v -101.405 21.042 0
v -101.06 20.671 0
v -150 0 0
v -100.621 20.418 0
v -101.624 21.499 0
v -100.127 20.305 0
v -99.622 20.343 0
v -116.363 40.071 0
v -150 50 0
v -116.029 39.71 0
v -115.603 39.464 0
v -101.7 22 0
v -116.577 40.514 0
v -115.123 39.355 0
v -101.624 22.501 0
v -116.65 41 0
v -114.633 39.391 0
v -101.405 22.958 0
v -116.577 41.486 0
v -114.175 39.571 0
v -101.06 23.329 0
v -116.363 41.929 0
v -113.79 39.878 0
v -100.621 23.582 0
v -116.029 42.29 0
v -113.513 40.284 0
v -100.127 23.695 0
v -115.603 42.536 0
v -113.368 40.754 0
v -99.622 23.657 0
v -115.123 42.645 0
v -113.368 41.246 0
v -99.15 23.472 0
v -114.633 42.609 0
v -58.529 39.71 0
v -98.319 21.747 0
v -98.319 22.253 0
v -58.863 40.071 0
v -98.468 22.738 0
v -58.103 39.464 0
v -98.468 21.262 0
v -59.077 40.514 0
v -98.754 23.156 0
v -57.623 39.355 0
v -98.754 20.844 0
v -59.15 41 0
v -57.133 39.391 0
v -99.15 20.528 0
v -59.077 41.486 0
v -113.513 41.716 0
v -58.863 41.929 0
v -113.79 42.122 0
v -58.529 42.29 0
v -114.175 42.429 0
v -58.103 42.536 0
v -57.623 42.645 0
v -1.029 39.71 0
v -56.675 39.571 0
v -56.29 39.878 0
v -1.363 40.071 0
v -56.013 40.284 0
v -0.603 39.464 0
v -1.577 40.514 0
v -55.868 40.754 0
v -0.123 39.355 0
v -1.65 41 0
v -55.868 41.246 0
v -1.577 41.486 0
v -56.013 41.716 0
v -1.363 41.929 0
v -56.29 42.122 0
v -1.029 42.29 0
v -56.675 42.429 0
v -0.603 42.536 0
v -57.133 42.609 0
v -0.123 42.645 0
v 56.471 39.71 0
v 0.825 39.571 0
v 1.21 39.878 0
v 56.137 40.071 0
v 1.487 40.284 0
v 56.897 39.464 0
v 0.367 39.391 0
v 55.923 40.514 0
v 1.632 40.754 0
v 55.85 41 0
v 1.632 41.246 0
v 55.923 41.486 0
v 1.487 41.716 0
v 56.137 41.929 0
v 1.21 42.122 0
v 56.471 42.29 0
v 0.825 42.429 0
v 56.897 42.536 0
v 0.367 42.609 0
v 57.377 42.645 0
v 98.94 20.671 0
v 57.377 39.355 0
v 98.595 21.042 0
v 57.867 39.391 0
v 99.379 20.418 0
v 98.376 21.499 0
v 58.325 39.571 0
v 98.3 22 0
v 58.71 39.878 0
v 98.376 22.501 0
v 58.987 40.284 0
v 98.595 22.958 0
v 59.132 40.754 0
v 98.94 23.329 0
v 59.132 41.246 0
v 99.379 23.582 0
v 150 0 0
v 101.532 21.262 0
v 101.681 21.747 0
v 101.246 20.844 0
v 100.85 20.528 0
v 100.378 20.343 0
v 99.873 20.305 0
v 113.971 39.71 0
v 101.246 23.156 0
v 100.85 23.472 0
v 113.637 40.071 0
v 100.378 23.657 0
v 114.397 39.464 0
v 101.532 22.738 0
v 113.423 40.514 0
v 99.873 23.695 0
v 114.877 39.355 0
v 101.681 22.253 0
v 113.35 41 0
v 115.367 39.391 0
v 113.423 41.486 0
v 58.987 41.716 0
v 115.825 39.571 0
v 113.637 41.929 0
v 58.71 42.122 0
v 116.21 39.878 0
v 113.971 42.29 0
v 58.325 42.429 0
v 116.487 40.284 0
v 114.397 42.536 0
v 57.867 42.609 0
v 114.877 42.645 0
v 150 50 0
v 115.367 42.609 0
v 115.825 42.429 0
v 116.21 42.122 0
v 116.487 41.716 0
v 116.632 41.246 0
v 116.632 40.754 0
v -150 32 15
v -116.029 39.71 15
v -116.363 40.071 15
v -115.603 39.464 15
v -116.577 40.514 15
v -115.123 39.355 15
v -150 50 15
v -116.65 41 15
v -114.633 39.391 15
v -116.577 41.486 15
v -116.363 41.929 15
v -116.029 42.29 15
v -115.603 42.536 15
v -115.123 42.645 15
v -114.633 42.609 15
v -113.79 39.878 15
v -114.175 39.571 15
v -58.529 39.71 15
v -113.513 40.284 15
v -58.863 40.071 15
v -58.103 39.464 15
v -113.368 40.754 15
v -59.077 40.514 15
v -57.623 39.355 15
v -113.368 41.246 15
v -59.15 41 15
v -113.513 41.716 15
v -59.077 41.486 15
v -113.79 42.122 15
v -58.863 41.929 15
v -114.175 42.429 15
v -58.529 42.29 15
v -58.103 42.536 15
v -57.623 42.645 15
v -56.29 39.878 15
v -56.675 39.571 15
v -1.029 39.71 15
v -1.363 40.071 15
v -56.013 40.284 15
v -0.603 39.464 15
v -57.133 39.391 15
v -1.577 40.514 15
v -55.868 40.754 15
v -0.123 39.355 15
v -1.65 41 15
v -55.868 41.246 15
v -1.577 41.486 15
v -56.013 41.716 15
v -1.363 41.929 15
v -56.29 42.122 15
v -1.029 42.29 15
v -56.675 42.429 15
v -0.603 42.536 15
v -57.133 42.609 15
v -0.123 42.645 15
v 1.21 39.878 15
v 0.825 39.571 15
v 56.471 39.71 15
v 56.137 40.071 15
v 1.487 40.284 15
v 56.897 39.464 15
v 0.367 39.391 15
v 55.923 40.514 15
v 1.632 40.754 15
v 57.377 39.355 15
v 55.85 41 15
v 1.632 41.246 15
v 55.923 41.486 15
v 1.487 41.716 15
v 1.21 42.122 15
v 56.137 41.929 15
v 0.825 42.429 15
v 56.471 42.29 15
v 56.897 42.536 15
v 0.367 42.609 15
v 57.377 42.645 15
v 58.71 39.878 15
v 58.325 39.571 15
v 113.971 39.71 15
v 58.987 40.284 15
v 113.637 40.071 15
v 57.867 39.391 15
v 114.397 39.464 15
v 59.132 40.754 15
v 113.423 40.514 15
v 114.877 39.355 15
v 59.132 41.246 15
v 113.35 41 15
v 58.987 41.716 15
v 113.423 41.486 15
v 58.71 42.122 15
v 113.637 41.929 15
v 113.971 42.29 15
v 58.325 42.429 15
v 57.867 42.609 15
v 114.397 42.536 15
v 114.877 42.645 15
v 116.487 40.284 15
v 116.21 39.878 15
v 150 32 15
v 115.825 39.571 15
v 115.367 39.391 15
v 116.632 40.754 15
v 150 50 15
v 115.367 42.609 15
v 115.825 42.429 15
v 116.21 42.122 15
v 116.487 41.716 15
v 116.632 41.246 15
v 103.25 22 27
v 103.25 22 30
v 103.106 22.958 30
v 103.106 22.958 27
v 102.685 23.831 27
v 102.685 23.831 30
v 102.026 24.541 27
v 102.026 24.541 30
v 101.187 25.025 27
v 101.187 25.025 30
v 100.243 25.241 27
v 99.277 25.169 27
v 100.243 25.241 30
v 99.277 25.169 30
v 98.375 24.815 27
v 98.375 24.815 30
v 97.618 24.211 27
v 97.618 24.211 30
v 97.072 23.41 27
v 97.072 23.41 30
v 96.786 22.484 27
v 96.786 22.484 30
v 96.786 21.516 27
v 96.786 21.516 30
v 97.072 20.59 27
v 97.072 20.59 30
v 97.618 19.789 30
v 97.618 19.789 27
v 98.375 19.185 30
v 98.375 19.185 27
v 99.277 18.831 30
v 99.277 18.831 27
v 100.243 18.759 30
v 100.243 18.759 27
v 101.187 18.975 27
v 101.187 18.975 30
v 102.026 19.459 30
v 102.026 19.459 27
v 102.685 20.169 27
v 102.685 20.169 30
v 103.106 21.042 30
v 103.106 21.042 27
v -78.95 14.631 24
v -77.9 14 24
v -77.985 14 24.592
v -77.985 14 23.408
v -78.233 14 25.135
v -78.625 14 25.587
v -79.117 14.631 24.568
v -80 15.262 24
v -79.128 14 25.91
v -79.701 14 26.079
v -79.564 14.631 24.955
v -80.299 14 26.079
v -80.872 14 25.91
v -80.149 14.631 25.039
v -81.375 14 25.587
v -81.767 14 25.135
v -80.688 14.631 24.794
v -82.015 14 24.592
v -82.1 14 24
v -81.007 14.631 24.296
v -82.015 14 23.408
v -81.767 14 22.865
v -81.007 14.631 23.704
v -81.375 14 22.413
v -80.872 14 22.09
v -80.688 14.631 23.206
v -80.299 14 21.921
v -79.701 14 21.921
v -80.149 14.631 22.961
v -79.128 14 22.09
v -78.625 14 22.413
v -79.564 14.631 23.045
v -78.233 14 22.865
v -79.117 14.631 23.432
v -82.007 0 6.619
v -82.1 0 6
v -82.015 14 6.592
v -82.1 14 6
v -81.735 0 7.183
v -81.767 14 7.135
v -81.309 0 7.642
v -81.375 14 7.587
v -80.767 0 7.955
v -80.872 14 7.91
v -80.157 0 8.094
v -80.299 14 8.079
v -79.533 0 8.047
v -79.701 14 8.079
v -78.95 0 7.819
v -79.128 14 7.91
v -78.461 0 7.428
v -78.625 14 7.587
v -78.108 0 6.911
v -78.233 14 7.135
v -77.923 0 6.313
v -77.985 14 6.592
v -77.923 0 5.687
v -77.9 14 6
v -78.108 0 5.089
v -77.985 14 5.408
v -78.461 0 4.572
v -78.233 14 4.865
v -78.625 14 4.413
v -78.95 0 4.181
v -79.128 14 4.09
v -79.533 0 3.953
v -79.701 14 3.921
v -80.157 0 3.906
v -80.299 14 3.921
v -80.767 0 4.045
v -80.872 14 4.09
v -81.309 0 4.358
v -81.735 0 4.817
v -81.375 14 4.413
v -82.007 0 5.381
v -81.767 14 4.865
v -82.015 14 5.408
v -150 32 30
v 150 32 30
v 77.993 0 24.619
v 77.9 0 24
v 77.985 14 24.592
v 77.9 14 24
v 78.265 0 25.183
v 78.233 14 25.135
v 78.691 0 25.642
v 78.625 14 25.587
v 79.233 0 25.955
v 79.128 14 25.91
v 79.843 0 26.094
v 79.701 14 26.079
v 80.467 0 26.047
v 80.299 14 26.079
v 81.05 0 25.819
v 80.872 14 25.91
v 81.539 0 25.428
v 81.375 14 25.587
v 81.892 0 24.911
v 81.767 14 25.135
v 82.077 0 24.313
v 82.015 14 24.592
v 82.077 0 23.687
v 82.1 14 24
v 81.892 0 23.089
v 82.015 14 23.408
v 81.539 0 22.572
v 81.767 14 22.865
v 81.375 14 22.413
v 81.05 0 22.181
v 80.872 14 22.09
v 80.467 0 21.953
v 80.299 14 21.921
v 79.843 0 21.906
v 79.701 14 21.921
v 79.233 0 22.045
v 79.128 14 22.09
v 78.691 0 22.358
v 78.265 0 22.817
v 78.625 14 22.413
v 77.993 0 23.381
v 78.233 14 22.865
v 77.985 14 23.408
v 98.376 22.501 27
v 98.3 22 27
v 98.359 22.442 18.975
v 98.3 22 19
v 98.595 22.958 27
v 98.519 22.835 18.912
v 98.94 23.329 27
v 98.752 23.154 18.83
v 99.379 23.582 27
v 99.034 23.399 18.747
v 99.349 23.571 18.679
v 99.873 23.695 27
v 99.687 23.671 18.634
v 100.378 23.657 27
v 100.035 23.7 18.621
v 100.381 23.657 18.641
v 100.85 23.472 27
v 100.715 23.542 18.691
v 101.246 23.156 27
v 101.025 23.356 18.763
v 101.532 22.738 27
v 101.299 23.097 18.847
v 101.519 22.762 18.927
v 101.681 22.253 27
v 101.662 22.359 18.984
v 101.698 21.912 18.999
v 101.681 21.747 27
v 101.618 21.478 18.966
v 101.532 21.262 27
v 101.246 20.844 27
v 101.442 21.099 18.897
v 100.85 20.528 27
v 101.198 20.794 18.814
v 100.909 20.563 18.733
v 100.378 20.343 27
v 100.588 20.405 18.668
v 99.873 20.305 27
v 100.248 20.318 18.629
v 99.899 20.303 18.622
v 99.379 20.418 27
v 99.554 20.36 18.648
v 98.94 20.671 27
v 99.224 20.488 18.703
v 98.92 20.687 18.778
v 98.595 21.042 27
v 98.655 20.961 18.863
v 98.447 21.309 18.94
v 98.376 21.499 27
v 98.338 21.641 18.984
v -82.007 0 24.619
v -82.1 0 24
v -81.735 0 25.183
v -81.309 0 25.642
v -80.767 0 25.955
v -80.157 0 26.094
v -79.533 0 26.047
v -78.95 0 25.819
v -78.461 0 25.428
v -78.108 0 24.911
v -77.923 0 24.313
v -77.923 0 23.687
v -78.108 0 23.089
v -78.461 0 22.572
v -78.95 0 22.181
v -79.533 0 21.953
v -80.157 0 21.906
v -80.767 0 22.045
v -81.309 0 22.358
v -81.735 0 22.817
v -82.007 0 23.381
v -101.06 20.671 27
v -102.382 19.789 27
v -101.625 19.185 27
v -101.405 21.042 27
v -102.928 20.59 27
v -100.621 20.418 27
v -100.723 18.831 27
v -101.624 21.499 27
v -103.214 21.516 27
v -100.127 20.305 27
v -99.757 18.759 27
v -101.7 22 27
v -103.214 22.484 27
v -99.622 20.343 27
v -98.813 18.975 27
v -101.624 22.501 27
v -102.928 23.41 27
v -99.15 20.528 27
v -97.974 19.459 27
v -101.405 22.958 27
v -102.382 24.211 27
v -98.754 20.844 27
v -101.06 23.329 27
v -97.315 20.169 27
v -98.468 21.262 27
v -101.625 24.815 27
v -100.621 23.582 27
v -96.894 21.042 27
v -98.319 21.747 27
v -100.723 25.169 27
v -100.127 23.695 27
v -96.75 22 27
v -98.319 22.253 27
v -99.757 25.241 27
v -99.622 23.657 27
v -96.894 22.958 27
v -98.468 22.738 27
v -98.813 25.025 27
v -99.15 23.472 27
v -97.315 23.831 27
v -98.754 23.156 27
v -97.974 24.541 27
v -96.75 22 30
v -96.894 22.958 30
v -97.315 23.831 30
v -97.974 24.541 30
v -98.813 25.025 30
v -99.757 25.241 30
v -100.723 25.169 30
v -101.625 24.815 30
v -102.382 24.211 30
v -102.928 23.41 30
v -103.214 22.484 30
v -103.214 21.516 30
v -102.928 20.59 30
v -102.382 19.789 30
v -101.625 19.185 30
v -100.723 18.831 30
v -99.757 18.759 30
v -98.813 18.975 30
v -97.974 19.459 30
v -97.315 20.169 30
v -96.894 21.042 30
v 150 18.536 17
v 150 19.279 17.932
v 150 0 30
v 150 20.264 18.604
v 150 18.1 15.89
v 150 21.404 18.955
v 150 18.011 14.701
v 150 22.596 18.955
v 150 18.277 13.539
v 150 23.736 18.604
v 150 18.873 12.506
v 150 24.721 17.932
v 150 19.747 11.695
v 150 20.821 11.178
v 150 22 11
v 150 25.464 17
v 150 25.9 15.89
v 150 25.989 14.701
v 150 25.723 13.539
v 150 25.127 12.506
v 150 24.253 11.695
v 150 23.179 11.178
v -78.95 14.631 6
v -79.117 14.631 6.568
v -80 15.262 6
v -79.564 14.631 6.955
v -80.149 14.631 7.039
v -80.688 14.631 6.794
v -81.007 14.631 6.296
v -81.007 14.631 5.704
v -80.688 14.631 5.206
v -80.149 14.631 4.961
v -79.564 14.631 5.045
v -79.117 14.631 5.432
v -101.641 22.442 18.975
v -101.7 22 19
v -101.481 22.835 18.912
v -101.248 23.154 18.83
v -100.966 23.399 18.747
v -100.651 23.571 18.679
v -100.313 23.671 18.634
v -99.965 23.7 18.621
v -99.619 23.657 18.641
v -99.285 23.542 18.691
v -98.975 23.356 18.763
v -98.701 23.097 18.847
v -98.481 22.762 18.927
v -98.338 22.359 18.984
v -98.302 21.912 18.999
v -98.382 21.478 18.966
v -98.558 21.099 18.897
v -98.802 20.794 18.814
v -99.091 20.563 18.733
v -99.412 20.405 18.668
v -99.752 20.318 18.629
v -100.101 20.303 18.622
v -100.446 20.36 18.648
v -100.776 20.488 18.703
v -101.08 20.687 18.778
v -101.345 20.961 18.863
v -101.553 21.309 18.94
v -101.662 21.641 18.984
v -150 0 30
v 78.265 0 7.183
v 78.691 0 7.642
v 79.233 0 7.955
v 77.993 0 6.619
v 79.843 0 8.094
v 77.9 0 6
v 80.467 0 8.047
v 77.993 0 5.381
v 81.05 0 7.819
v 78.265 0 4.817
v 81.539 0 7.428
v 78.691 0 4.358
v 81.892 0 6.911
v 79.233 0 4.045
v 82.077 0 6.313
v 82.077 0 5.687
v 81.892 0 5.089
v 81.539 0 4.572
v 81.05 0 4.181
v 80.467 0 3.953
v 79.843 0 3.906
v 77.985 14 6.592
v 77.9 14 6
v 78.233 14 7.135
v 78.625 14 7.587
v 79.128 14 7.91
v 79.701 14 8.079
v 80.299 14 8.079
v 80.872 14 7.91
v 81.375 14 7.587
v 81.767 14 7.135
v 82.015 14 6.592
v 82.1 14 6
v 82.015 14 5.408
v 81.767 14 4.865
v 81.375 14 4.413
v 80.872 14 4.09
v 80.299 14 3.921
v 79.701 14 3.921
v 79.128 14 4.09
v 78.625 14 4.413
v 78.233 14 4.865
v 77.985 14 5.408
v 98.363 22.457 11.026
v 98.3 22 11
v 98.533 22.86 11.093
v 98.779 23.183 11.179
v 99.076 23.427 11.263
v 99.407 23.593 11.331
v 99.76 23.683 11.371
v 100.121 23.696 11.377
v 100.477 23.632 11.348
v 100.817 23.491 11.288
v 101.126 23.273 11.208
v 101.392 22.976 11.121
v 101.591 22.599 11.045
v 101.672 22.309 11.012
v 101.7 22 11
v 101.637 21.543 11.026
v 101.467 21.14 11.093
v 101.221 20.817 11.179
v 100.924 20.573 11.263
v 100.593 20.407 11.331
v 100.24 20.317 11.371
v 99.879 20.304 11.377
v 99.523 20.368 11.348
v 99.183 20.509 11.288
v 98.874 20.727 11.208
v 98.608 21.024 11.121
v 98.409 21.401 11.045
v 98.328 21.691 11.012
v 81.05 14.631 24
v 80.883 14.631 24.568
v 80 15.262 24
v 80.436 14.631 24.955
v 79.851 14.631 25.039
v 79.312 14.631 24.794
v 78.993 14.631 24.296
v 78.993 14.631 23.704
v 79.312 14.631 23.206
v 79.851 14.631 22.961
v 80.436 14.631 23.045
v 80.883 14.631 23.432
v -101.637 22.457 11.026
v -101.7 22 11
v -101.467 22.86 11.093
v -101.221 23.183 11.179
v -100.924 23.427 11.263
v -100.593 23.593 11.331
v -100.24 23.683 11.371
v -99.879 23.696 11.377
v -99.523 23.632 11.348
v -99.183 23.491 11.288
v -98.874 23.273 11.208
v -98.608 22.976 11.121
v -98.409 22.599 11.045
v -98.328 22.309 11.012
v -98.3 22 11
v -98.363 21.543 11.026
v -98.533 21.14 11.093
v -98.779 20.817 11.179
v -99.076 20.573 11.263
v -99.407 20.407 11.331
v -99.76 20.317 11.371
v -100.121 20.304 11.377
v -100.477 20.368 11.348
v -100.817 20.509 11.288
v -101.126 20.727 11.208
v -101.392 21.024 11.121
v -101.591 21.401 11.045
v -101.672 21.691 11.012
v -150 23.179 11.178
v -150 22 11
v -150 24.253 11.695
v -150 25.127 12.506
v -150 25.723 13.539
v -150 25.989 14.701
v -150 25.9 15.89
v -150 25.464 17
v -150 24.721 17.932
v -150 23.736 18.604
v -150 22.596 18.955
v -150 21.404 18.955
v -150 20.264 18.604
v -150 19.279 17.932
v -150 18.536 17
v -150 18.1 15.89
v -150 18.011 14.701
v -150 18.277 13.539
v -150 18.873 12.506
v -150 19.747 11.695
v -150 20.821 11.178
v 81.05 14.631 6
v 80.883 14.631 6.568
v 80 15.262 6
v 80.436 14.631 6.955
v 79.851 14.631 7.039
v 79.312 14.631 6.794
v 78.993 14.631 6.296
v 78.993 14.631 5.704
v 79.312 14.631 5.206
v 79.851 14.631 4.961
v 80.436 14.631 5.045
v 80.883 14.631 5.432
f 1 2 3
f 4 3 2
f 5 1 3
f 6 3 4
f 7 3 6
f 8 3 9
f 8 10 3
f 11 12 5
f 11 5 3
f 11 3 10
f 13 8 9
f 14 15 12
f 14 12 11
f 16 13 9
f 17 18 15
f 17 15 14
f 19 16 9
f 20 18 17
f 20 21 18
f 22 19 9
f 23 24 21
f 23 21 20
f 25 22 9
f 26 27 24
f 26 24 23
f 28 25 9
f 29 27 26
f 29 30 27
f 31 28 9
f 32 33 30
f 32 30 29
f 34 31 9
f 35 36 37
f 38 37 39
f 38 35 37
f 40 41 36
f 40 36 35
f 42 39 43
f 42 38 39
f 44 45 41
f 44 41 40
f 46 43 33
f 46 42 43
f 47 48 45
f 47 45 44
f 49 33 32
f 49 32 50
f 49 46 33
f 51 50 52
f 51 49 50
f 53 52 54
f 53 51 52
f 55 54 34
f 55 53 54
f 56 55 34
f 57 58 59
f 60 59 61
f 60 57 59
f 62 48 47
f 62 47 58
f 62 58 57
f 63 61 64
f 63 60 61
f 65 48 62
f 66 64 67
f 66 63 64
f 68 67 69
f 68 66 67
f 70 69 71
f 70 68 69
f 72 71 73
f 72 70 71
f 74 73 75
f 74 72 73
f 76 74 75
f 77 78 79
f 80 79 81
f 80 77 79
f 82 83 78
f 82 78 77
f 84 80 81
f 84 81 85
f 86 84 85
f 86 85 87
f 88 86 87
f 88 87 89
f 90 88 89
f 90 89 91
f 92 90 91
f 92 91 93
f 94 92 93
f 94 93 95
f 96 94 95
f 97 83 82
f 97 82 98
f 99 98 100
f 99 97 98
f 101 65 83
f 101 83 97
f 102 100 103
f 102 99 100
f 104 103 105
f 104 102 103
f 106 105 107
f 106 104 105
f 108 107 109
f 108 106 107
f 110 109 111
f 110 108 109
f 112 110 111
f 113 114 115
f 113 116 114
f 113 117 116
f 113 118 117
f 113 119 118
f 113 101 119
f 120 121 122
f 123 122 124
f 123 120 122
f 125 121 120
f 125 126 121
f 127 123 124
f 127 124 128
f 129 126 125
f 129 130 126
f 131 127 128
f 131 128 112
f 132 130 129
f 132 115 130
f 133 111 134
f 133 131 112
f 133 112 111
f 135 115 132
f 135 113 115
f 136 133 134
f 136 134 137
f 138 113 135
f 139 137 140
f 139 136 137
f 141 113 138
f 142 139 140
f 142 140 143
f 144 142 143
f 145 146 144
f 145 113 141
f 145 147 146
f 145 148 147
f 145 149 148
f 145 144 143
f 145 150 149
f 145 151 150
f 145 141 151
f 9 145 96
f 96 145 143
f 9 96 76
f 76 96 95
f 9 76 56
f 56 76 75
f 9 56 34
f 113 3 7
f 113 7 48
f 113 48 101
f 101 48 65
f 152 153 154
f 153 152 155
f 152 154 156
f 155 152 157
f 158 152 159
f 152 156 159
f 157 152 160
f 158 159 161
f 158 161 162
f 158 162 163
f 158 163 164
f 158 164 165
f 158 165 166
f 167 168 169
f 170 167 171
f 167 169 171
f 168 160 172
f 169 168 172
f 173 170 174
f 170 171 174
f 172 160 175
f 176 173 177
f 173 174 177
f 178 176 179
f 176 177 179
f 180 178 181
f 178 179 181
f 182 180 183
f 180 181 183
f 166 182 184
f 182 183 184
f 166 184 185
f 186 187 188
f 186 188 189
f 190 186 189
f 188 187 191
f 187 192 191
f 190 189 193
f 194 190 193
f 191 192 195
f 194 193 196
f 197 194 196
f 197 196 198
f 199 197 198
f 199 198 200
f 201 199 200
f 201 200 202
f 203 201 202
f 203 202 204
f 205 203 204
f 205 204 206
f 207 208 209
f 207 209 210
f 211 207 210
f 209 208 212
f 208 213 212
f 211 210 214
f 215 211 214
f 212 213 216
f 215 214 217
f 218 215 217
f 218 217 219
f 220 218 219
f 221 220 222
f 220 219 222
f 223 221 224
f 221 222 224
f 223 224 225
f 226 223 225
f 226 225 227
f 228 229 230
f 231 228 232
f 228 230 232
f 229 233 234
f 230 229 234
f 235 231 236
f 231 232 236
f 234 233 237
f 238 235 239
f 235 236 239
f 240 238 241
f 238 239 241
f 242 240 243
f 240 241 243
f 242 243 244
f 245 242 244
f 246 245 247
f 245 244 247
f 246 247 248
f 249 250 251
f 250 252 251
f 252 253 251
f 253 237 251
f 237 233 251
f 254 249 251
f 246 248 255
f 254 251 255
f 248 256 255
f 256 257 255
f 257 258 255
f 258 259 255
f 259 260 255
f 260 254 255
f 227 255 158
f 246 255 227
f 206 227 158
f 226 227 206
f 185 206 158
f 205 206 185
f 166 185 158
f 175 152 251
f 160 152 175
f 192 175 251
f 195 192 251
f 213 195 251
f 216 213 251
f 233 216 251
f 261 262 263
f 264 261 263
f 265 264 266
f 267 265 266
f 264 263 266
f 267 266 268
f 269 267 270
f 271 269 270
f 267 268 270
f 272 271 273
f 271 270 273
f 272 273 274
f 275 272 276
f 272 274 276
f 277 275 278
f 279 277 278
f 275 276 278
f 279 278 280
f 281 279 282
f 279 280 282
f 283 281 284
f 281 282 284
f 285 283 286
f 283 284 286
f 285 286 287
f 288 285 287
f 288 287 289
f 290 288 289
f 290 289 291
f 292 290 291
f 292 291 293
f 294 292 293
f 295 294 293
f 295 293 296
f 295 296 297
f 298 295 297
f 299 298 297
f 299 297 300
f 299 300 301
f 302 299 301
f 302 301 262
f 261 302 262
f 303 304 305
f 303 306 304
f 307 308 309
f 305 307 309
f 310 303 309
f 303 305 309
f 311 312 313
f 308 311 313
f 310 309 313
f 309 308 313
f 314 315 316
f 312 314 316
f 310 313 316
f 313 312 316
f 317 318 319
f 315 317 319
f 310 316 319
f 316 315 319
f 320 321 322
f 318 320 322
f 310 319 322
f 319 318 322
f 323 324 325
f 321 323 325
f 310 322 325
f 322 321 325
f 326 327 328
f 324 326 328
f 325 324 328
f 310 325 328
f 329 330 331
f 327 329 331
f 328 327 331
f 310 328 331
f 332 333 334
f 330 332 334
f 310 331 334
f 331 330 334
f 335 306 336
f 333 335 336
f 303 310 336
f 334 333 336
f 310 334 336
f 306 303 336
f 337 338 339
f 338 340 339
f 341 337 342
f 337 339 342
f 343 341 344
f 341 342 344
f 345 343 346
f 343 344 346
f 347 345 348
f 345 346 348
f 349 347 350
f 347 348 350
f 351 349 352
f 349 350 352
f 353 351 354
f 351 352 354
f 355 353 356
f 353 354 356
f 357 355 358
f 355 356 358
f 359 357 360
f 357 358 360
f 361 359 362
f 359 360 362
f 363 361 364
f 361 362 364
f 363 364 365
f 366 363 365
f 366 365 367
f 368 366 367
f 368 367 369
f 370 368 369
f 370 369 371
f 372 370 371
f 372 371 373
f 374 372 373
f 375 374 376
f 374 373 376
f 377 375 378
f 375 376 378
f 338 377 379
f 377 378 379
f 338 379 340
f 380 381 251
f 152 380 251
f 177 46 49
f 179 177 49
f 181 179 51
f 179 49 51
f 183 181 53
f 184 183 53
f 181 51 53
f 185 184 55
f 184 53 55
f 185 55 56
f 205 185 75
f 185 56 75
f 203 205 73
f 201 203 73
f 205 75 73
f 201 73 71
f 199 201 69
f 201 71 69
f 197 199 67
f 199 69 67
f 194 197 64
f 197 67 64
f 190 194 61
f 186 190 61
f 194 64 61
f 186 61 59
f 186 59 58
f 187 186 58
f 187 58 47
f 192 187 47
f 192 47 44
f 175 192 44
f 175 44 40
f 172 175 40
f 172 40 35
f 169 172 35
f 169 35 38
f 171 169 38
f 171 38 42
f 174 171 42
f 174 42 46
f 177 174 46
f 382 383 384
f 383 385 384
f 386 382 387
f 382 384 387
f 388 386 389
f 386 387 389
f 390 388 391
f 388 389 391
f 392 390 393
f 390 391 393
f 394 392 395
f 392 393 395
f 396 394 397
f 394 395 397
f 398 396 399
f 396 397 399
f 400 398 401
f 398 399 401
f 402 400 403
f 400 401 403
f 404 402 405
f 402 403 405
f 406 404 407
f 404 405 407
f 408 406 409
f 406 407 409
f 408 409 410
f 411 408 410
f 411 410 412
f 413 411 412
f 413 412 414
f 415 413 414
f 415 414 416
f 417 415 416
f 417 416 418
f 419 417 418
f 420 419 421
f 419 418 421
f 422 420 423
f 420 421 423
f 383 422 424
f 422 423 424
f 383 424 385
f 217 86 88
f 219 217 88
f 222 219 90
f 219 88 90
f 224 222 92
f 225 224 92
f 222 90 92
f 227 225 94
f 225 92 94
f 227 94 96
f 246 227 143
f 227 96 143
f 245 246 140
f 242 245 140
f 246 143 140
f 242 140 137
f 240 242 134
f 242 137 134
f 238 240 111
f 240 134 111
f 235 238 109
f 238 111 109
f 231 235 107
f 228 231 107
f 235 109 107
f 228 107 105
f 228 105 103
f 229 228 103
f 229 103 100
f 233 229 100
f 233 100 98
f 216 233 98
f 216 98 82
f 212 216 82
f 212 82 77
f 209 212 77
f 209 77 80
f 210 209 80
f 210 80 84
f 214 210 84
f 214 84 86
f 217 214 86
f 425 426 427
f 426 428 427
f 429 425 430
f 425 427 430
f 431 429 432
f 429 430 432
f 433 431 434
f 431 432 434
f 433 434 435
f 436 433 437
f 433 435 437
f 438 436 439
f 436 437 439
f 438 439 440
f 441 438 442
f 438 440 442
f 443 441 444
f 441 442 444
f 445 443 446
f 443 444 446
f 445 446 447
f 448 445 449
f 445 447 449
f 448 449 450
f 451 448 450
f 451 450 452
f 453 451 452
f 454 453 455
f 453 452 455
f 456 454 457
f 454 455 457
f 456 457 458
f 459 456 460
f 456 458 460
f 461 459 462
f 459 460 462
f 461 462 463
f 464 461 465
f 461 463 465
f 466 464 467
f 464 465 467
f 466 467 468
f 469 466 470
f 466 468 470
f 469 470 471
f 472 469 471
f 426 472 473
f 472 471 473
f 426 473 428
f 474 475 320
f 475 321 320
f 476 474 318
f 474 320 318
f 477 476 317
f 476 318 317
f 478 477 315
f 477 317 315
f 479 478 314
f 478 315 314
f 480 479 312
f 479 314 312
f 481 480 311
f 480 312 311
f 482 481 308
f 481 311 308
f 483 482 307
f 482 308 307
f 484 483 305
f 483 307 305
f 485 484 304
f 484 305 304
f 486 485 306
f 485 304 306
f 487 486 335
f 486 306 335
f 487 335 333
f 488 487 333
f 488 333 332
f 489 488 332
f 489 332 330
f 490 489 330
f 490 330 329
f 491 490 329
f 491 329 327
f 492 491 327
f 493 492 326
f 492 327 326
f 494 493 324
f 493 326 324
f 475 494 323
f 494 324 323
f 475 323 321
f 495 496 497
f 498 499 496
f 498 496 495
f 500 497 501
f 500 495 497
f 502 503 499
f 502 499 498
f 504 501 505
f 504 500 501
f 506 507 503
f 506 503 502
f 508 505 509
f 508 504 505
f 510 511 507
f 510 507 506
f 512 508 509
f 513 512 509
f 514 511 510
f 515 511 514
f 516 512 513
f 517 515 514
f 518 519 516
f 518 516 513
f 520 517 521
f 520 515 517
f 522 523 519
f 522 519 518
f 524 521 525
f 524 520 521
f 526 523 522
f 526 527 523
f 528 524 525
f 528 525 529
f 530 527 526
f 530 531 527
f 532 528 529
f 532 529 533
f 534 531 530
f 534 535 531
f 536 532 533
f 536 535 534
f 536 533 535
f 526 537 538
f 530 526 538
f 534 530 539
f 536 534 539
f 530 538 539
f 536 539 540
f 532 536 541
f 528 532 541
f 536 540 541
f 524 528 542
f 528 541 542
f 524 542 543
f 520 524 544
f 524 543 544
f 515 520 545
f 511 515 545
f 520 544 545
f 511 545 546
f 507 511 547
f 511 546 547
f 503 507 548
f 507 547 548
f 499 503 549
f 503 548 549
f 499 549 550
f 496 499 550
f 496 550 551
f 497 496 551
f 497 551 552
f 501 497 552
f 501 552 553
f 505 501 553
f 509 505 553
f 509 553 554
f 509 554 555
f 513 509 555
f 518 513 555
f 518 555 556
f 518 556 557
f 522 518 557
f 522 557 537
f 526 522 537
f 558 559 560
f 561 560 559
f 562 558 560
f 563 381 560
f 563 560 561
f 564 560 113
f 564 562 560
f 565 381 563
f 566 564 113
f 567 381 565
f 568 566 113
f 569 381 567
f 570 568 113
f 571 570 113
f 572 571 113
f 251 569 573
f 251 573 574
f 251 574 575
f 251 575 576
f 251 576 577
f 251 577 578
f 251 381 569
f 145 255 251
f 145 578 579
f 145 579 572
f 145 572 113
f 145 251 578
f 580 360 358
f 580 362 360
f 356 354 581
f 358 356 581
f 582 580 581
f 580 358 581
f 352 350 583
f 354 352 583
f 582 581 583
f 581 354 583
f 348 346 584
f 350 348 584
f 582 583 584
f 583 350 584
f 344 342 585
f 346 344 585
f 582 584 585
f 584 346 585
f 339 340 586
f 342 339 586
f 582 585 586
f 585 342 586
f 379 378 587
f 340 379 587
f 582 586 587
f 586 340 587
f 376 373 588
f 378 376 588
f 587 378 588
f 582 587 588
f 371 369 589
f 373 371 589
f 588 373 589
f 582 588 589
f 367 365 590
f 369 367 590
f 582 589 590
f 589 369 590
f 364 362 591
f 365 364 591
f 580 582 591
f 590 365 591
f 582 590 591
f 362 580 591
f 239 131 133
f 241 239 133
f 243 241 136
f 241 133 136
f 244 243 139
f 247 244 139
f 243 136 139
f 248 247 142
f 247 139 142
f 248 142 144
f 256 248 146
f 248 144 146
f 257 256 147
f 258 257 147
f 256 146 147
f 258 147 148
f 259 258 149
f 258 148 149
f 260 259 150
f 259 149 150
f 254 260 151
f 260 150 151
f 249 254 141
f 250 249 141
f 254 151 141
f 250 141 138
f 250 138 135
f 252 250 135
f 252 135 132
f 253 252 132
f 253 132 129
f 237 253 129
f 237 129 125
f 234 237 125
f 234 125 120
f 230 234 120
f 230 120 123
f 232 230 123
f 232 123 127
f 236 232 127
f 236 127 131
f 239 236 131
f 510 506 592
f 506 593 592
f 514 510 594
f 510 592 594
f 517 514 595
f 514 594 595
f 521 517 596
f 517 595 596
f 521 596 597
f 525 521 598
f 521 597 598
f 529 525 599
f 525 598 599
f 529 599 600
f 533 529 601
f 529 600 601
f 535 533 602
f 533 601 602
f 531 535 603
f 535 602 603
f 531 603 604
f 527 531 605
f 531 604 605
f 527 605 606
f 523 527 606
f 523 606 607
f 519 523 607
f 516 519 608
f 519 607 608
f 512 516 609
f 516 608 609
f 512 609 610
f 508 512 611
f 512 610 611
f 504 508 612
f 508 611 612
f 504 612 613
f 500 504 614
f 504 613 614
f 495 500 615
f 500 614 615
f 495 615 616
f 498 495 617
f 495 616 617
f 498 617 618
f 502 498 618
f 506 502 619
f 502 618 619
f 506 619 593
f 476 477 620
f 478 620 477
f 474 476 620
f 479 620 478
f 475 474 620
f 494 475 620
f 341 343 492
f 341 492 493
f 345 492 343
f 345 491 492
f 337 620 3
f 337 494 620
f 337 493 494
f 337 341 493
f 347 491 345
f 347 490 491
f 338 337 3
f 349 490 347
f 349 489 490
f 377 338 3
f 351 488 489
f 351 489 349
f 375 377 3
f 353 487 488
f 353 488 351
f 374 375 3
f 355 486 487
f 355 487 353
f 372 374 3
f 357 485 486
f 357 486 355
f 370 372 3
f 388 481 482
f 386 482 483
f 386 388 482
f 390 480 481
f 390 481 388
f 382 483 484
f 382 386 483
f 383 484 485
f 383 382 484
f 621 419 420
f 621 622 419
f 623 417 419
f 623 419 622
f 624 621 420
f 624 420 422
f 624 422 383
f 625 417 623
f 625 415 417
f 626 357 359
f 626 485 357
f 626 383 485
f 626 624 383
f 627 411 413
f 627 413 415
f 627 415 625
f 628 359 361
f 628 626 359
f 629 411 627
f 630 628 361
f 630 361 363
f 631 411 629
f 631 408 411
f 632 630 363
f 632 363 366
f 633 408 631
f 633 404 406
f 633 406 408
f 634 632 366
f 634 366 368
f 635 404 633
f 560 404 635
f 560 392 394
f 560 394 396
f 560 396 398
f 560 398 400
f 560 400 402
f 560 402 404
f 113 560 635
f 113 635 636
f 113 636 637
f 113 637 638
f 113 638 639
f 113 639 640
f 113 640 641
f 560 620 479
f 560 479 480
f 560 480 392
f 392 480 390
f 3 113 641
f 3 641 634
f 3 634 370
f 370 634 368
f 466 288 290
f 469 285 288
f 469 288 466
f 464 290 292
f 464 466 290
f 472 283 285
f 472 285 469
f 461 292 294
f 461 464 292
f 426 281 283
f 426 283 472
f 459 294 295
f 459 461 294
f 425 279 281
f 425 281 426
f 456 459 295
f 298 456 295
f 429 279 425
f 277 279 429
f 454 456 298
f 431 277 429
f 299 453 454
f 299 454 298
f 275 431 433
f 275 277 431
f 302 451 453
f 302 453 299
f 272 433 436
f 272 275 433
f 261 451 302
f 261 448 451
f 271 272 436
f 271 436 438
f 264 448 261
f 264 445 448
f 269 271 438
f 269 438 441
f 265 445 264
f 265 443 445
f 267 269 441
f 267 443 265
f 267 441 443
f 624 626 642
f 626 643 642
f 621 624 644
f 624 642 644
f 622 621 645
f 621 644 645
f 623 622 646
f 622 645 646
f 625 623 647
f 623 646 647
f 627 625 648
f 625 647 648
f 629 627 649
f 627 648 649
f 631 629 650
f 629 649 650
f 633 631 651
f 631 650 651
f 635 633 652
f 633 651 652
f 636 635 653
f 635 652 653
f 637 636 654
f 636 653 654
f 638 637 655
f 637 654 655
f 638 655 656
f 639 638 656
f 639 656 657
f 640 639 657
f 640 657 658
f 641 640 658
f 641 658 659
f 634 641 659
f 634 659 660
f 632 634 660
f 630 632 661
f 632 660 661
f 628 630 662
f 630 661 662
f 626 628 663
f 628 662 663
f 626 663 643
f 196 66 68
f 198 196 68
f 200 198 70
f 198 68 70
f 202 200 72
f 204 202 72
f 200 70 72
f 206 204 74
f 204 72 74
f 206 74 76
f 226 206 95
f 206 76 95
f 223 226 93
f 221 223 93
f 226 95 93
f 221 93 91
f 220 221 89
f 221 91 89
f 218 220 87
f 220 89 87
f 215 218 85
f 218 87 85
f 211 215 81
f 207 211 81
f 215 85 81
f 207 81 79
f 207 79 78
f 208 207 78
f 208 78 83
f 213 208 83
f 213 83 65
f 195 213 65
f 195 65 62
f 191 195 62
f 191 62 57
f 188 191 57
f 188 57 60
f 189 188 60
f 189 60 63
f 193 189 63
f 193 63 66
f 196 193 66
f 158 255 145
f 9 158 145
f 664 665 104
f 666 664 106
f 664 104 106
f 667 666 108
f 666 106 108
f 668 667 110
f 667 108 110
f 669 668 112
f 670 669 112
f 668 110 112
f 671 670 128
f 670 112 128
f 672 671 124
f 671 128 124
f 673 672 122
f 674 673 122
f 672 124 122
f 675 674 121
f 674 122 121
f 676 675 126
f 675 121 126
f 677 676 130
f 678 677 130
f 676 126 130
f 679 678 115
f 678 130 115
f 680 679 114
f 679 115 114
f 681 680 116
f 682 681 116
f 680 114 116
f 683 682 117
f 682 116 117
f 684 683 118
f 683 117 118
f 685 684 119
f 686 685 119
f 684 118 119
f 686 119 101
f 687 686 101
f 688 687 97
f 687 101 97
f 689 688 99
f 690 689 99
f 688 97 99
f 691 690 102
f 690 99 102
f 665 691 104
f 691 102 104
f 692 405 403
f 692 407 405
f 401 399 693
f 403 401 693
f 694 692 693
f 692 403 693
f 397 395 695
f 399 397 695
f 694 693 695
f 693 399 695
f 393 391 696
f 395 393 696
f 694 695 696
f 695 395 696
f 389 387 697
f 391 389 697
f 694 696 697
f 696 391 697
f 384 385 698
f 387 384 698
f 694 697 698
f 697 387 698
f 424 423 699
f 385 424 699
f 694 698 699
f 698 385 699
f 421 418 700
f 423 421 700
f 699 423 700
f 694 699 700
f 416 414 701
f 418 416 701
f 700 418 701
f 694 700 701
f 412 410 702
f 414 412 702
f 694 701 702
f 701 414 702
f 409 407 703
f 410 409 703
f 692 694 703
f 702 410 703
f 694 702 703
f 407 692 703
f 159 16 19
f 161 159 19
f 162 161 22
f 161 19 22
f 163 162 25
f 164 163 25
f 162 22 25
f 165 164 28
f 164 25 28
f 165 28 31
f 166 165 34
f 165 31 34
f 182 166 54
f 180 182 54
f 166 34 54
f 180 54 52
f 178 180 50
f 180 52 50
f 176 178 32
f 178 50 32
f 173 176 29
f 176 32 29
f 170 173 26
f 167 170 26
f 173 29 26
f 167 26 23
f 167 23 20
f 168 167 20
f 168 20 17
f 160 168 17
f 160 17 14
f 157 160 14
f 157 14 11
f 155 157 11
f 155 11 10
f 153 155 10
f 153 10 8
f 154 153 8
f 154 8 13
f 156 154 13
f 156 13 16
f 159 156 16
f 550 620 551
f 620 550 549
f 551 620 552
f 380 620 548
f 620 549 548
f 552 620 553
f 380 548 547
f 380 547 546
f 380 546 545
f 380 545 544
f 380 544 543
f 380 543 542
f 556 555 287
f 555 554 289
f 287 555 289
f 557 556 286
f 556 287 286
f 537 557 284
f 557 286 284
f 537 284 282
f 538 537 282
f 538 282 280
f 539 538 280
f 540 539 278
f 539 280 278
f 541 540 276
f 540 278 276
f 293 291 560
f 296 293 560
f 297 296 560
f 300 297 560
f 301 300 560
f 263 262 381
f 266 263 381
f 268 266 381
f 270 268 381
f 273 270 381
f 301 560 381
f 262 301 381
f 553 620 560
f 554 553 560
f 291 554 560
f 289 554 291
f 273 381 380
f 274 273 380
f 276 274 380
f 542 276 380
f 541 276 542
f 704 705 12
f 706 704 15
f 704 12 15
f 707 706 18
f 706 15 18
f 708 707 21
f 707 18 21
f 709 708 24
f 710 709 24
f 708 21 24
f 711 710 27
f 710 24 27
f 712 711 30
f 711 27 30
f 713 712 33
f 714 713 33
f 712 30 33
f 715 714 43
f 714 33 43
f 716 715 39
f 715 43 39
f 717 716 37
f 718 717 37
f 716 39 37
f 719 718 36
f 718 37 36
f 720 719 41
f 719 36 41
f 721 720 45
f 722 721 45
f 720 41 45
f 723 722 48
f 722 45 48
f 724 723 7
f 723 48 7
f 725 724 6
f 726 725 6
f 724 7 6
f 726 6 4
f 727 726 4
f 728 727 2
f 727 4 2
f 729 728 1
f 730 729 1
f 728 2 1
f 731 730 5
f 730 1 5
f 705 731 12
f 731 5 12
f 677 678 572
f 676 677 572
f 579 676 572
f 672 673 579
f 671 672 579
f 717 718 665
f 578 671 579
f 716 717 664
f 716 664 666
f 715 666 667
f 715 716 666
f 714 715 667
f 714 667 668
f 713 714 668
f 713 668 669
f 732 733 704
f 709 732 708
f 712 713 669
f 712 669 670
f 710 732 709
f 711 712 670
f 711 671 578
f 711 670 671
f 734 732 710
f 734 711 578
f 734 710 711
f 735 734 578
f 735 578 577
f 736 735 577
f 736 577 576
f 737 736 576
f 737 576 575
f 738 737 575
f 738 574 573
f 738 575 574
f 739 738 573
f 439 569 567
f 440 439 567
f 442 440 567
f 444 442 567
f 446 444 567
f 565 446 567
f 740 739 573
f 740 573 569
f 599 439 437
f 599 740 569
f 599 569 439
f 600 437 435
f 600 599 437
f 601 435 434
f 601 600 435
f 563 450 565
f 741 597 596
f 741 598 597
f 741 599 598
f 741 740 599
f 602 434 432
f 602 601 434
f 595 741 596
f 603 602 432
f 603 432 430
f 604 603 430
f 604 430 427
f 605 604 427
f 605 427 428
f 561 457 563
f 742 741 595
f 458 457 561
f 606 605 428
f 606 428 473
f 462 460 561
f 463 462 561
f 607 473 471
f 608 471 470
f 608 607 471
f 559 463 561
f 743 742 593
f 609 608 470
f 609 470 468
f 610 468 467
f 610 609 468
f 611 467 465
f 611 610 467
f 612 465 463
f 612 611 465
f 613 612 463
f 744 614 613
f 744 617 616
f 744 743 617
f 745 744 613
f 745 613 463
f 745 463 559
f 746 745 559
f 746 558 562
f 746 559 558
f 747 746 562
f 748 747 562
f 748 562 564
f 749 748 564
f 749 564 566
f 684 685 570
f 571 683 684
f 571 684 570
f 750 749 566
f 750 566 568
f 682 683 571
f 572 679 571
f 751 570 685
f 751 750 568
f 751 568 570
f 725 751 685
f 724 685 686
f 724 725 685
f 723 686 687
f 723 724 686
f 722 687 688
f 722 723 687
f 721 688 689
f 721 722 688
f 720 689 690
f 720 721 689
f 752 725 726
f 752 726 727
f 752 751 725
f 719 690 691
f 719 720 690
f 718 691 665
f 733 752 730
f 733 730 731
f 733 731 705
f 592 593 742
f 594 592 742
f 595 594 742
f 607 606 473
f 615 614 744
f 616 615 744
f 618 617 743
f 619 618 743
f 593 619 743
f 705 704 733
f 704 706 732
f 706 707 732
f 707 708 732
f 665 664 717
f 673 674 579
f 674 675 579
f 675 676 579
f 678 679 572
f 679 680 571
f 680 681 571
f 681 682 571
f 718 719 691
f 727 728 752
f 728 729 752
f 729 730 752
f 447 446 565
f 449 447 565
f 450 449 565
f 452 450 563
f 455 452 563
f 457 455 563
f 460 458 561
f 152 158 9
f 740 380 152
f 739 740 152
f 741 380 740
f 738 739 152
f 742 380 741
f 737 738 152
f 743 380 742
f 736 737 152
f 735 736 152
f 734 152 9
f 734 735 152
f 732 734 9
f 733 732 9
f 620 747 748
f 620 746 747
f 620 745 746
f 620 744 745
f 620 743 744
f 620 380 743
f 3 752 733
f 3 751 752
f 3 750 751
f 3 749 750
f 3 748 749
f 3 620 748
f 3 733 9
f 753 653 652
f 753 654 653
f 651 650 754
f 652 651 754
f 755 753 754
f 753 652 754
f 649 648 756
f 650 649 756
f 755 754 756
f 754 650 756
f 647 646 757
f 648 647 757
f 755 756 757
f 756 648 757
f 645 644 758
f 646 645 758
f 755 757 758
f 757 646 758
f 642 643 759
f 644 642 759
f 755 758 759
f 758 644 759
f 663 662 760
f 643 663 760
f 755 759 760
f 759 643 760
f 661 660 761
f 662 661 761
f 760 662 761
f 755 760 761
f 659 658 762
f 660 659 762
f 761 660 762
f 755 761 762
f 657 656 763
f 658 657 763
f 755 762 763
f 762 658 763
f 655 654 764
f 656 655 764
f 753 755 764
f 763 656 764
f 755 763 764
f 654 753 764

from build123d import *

# Parameters (mm, degrees)
SKETCH1_W                                       = 30
SKETCH1_H                                       = 32
BOSS_EXTRUDE1_DEPTH                             = 150
CUT_EXTRUDE1_REACH                              = 158.282
SKETCH2_W                                       = 15
SKETCH2_H                                       = 18
CUT_EXTRUDE1_DIRECTION_2_REACH                  = 158.282
CUT_EXTRUDE2_DEPTH                              = 161.934769394
CUT_EXTRUDE2_DEPTH_BACK                         = 161.934769394
SKETCH3_R                                       = 4
CBORE_FOR_M3_SOCKET_HEAD_CAP_SCREW1_D           = 3.4
CBORE_FOR_M3_SOCKET_HEAD_CAP_SCREW1_CBORE_D     = 6.5
CBORE_FOR_M3_SOCKET_HEAD_CAP_SCREW1_CBORE_DEPTH = 3
M4X0_7_TAPPED_HOLE1_D                           = 3.3
M5X0_8_TAPPED_HOLE1_D                           = 4.2
M5X0_8_TAPPED_HOLE1_DEPTH                       = 14
M5X0_8_TAPPED_HOLE1_TIP                         = 1.2618073


with BuildPart() as part:
    # Sketch1 → Boss-Extrude1 (new, symmetric)
    with BuildSketch(Plane(origin=(0, 0, 0), x_dir=(0, 0, -1), z_dir=(1, 0, 0))):
        with Locations((-15, 16)):
            Rectangle(SKETCH1_W, SKETCH1_H)
    extrude(amount=BOSS_EXTRUDE1_DEPTH, both=True)

    # Cut-Extrude1: up to this face of the body (flat: up to its plane)
    cut_extrude1_end = Plane(part.part.faces().sort_by_distance((150, 16, 15))[0])
    # Sketch2 → Cut-Extrude1 (add, up to the picked face)
    with BuildSketch(Plane(origin=(0, 0, 0), x_dir=(0, 0, -1), z_dir=(1, 0, 0)), mode=Mode.PRIVATE) as cut_extrude1_sk1:
        with Locations((-7.5, 41)):
            Rectangle(SKETCH2_W, SKETCH2_H)
    cut_extrude1_tool1 = split(extrude(cut_extrude1_sk1.sketch, amount=CUT_EXTRUDE1_REACH, mode=Mode.PRIVATE), bisect_by=cut_extrude1_end, keep=Keep.BOTH, mode=Mode.PRIVATE)
    add(cut_extrude1_tool1.solids().sort_by(Axis((0, 41, 7.5), (1, 0, 0)))[0])

    # Cut-Extrude1 direction 2: up to this face of the body (flat: up to its plane)
    cut_extrude1_direction_2_end = Plane(part.part.faces().sort_by_distance((-150, 16, 15))[0])
    # Sketch2 → Cut-Extrude1 direction 2 (add, up to the picked face)
    with BuildSketch(Plane(origin=(0, 0, 0), x_dir=(0, 0, -1), z_dir=(1, 0, 0)), mode=Mode.PRIVATE) as cut_extrude1_direction_2_sk1:
        with Locations((-7.5, 41)):
            Rectangle(SKETCH2_W, SKETCH2_H)
    cut_extrude1_direction_2_tool1 = split(extrude(cut_extrude1_direction_2_sk1.sketch, amount=-CUT_EXTRUDE1_DIRECTION_2_REACH, mode=Mode.PRIVATE), bisect_by=cut_extrude1_direction_2_end, keep=Keep.BOTH, mode=Mode.PRIVATE)
    add(cut_extrude1_direction_2_tool1.solids().sort_by(Axis((0, 41, 7.5), (-1, 0, 0)))[0])

    # Sketch3 → Cut-Extrude2 (cut, two sides: drawn at the far end of the back side and taken through both)
    with BuildSketch(Plane(origin=(0, 0, 0), x_dir=(0, 0, -1), z_dir=(1, 0, 0)).offset(-CUT_EXTRUDE2_DEPTH_BACK)):
        with Locations((-15, 22)):
            Circle(SKETCH3_R)
    extrude(amount=CUT_EXTRUDE2_DEPTH + CUT_EXTRUDE2_DEPTH_BACK, mode=Mode.SUBTRACT)

    # CBORE for M3 Socket Head Cap Screw1 (through all)
    with Locations(Plane.XY.offset(30)):
        with Locations((100, 22), (-100, 22)):
            CounterBoreHole(CBORE_FOR_M3_SOCKET_HEAD_CAP_SCREW1_D / 2, CBORE_FOR_M3_SOCKET_HEAD_CAP_SCREW1_CBORE_D / 2, CBORE_FOR_M3_SOCKET_HEAD_CAP_SCREW1_CBORE_DEPTH)

    # M4x0.7 Tapped Hole1 (through all)
    with Locations(Plane.XY.offset(15)):
        with Locations((115, 41), (57.5, 41), (0, 41), (-57.5, 41), (-115, 41)):
            Hole(M4X0_7_TAPPED_HOLE1_D / 2)

    # M5x0.8 Tapped Hole1
    with Locations(Plane.XZ):
        with Locations((-80, 24), (-80, 6), (80, 6), (80, 24)):
            Hole(M5X0_8_TAPPED_HOLE1_D / 2, depth=M5X0_8_TAPPED_HOLE1_DEPTH)
            with Locations((0, 0, -(M5X0_8_TAPPED_HOLE1_DEPTH + M5X0_8_TAPPED_HOLE1_TIP / 2))):  # 118° drill point
                Cone(0, M5X0_8_TAPPED_HOLE1_D / 2, M5X0_8_TAPPED_HOLE1_TIP, mode=Mode.SUBTRACT)


solid = part.part
